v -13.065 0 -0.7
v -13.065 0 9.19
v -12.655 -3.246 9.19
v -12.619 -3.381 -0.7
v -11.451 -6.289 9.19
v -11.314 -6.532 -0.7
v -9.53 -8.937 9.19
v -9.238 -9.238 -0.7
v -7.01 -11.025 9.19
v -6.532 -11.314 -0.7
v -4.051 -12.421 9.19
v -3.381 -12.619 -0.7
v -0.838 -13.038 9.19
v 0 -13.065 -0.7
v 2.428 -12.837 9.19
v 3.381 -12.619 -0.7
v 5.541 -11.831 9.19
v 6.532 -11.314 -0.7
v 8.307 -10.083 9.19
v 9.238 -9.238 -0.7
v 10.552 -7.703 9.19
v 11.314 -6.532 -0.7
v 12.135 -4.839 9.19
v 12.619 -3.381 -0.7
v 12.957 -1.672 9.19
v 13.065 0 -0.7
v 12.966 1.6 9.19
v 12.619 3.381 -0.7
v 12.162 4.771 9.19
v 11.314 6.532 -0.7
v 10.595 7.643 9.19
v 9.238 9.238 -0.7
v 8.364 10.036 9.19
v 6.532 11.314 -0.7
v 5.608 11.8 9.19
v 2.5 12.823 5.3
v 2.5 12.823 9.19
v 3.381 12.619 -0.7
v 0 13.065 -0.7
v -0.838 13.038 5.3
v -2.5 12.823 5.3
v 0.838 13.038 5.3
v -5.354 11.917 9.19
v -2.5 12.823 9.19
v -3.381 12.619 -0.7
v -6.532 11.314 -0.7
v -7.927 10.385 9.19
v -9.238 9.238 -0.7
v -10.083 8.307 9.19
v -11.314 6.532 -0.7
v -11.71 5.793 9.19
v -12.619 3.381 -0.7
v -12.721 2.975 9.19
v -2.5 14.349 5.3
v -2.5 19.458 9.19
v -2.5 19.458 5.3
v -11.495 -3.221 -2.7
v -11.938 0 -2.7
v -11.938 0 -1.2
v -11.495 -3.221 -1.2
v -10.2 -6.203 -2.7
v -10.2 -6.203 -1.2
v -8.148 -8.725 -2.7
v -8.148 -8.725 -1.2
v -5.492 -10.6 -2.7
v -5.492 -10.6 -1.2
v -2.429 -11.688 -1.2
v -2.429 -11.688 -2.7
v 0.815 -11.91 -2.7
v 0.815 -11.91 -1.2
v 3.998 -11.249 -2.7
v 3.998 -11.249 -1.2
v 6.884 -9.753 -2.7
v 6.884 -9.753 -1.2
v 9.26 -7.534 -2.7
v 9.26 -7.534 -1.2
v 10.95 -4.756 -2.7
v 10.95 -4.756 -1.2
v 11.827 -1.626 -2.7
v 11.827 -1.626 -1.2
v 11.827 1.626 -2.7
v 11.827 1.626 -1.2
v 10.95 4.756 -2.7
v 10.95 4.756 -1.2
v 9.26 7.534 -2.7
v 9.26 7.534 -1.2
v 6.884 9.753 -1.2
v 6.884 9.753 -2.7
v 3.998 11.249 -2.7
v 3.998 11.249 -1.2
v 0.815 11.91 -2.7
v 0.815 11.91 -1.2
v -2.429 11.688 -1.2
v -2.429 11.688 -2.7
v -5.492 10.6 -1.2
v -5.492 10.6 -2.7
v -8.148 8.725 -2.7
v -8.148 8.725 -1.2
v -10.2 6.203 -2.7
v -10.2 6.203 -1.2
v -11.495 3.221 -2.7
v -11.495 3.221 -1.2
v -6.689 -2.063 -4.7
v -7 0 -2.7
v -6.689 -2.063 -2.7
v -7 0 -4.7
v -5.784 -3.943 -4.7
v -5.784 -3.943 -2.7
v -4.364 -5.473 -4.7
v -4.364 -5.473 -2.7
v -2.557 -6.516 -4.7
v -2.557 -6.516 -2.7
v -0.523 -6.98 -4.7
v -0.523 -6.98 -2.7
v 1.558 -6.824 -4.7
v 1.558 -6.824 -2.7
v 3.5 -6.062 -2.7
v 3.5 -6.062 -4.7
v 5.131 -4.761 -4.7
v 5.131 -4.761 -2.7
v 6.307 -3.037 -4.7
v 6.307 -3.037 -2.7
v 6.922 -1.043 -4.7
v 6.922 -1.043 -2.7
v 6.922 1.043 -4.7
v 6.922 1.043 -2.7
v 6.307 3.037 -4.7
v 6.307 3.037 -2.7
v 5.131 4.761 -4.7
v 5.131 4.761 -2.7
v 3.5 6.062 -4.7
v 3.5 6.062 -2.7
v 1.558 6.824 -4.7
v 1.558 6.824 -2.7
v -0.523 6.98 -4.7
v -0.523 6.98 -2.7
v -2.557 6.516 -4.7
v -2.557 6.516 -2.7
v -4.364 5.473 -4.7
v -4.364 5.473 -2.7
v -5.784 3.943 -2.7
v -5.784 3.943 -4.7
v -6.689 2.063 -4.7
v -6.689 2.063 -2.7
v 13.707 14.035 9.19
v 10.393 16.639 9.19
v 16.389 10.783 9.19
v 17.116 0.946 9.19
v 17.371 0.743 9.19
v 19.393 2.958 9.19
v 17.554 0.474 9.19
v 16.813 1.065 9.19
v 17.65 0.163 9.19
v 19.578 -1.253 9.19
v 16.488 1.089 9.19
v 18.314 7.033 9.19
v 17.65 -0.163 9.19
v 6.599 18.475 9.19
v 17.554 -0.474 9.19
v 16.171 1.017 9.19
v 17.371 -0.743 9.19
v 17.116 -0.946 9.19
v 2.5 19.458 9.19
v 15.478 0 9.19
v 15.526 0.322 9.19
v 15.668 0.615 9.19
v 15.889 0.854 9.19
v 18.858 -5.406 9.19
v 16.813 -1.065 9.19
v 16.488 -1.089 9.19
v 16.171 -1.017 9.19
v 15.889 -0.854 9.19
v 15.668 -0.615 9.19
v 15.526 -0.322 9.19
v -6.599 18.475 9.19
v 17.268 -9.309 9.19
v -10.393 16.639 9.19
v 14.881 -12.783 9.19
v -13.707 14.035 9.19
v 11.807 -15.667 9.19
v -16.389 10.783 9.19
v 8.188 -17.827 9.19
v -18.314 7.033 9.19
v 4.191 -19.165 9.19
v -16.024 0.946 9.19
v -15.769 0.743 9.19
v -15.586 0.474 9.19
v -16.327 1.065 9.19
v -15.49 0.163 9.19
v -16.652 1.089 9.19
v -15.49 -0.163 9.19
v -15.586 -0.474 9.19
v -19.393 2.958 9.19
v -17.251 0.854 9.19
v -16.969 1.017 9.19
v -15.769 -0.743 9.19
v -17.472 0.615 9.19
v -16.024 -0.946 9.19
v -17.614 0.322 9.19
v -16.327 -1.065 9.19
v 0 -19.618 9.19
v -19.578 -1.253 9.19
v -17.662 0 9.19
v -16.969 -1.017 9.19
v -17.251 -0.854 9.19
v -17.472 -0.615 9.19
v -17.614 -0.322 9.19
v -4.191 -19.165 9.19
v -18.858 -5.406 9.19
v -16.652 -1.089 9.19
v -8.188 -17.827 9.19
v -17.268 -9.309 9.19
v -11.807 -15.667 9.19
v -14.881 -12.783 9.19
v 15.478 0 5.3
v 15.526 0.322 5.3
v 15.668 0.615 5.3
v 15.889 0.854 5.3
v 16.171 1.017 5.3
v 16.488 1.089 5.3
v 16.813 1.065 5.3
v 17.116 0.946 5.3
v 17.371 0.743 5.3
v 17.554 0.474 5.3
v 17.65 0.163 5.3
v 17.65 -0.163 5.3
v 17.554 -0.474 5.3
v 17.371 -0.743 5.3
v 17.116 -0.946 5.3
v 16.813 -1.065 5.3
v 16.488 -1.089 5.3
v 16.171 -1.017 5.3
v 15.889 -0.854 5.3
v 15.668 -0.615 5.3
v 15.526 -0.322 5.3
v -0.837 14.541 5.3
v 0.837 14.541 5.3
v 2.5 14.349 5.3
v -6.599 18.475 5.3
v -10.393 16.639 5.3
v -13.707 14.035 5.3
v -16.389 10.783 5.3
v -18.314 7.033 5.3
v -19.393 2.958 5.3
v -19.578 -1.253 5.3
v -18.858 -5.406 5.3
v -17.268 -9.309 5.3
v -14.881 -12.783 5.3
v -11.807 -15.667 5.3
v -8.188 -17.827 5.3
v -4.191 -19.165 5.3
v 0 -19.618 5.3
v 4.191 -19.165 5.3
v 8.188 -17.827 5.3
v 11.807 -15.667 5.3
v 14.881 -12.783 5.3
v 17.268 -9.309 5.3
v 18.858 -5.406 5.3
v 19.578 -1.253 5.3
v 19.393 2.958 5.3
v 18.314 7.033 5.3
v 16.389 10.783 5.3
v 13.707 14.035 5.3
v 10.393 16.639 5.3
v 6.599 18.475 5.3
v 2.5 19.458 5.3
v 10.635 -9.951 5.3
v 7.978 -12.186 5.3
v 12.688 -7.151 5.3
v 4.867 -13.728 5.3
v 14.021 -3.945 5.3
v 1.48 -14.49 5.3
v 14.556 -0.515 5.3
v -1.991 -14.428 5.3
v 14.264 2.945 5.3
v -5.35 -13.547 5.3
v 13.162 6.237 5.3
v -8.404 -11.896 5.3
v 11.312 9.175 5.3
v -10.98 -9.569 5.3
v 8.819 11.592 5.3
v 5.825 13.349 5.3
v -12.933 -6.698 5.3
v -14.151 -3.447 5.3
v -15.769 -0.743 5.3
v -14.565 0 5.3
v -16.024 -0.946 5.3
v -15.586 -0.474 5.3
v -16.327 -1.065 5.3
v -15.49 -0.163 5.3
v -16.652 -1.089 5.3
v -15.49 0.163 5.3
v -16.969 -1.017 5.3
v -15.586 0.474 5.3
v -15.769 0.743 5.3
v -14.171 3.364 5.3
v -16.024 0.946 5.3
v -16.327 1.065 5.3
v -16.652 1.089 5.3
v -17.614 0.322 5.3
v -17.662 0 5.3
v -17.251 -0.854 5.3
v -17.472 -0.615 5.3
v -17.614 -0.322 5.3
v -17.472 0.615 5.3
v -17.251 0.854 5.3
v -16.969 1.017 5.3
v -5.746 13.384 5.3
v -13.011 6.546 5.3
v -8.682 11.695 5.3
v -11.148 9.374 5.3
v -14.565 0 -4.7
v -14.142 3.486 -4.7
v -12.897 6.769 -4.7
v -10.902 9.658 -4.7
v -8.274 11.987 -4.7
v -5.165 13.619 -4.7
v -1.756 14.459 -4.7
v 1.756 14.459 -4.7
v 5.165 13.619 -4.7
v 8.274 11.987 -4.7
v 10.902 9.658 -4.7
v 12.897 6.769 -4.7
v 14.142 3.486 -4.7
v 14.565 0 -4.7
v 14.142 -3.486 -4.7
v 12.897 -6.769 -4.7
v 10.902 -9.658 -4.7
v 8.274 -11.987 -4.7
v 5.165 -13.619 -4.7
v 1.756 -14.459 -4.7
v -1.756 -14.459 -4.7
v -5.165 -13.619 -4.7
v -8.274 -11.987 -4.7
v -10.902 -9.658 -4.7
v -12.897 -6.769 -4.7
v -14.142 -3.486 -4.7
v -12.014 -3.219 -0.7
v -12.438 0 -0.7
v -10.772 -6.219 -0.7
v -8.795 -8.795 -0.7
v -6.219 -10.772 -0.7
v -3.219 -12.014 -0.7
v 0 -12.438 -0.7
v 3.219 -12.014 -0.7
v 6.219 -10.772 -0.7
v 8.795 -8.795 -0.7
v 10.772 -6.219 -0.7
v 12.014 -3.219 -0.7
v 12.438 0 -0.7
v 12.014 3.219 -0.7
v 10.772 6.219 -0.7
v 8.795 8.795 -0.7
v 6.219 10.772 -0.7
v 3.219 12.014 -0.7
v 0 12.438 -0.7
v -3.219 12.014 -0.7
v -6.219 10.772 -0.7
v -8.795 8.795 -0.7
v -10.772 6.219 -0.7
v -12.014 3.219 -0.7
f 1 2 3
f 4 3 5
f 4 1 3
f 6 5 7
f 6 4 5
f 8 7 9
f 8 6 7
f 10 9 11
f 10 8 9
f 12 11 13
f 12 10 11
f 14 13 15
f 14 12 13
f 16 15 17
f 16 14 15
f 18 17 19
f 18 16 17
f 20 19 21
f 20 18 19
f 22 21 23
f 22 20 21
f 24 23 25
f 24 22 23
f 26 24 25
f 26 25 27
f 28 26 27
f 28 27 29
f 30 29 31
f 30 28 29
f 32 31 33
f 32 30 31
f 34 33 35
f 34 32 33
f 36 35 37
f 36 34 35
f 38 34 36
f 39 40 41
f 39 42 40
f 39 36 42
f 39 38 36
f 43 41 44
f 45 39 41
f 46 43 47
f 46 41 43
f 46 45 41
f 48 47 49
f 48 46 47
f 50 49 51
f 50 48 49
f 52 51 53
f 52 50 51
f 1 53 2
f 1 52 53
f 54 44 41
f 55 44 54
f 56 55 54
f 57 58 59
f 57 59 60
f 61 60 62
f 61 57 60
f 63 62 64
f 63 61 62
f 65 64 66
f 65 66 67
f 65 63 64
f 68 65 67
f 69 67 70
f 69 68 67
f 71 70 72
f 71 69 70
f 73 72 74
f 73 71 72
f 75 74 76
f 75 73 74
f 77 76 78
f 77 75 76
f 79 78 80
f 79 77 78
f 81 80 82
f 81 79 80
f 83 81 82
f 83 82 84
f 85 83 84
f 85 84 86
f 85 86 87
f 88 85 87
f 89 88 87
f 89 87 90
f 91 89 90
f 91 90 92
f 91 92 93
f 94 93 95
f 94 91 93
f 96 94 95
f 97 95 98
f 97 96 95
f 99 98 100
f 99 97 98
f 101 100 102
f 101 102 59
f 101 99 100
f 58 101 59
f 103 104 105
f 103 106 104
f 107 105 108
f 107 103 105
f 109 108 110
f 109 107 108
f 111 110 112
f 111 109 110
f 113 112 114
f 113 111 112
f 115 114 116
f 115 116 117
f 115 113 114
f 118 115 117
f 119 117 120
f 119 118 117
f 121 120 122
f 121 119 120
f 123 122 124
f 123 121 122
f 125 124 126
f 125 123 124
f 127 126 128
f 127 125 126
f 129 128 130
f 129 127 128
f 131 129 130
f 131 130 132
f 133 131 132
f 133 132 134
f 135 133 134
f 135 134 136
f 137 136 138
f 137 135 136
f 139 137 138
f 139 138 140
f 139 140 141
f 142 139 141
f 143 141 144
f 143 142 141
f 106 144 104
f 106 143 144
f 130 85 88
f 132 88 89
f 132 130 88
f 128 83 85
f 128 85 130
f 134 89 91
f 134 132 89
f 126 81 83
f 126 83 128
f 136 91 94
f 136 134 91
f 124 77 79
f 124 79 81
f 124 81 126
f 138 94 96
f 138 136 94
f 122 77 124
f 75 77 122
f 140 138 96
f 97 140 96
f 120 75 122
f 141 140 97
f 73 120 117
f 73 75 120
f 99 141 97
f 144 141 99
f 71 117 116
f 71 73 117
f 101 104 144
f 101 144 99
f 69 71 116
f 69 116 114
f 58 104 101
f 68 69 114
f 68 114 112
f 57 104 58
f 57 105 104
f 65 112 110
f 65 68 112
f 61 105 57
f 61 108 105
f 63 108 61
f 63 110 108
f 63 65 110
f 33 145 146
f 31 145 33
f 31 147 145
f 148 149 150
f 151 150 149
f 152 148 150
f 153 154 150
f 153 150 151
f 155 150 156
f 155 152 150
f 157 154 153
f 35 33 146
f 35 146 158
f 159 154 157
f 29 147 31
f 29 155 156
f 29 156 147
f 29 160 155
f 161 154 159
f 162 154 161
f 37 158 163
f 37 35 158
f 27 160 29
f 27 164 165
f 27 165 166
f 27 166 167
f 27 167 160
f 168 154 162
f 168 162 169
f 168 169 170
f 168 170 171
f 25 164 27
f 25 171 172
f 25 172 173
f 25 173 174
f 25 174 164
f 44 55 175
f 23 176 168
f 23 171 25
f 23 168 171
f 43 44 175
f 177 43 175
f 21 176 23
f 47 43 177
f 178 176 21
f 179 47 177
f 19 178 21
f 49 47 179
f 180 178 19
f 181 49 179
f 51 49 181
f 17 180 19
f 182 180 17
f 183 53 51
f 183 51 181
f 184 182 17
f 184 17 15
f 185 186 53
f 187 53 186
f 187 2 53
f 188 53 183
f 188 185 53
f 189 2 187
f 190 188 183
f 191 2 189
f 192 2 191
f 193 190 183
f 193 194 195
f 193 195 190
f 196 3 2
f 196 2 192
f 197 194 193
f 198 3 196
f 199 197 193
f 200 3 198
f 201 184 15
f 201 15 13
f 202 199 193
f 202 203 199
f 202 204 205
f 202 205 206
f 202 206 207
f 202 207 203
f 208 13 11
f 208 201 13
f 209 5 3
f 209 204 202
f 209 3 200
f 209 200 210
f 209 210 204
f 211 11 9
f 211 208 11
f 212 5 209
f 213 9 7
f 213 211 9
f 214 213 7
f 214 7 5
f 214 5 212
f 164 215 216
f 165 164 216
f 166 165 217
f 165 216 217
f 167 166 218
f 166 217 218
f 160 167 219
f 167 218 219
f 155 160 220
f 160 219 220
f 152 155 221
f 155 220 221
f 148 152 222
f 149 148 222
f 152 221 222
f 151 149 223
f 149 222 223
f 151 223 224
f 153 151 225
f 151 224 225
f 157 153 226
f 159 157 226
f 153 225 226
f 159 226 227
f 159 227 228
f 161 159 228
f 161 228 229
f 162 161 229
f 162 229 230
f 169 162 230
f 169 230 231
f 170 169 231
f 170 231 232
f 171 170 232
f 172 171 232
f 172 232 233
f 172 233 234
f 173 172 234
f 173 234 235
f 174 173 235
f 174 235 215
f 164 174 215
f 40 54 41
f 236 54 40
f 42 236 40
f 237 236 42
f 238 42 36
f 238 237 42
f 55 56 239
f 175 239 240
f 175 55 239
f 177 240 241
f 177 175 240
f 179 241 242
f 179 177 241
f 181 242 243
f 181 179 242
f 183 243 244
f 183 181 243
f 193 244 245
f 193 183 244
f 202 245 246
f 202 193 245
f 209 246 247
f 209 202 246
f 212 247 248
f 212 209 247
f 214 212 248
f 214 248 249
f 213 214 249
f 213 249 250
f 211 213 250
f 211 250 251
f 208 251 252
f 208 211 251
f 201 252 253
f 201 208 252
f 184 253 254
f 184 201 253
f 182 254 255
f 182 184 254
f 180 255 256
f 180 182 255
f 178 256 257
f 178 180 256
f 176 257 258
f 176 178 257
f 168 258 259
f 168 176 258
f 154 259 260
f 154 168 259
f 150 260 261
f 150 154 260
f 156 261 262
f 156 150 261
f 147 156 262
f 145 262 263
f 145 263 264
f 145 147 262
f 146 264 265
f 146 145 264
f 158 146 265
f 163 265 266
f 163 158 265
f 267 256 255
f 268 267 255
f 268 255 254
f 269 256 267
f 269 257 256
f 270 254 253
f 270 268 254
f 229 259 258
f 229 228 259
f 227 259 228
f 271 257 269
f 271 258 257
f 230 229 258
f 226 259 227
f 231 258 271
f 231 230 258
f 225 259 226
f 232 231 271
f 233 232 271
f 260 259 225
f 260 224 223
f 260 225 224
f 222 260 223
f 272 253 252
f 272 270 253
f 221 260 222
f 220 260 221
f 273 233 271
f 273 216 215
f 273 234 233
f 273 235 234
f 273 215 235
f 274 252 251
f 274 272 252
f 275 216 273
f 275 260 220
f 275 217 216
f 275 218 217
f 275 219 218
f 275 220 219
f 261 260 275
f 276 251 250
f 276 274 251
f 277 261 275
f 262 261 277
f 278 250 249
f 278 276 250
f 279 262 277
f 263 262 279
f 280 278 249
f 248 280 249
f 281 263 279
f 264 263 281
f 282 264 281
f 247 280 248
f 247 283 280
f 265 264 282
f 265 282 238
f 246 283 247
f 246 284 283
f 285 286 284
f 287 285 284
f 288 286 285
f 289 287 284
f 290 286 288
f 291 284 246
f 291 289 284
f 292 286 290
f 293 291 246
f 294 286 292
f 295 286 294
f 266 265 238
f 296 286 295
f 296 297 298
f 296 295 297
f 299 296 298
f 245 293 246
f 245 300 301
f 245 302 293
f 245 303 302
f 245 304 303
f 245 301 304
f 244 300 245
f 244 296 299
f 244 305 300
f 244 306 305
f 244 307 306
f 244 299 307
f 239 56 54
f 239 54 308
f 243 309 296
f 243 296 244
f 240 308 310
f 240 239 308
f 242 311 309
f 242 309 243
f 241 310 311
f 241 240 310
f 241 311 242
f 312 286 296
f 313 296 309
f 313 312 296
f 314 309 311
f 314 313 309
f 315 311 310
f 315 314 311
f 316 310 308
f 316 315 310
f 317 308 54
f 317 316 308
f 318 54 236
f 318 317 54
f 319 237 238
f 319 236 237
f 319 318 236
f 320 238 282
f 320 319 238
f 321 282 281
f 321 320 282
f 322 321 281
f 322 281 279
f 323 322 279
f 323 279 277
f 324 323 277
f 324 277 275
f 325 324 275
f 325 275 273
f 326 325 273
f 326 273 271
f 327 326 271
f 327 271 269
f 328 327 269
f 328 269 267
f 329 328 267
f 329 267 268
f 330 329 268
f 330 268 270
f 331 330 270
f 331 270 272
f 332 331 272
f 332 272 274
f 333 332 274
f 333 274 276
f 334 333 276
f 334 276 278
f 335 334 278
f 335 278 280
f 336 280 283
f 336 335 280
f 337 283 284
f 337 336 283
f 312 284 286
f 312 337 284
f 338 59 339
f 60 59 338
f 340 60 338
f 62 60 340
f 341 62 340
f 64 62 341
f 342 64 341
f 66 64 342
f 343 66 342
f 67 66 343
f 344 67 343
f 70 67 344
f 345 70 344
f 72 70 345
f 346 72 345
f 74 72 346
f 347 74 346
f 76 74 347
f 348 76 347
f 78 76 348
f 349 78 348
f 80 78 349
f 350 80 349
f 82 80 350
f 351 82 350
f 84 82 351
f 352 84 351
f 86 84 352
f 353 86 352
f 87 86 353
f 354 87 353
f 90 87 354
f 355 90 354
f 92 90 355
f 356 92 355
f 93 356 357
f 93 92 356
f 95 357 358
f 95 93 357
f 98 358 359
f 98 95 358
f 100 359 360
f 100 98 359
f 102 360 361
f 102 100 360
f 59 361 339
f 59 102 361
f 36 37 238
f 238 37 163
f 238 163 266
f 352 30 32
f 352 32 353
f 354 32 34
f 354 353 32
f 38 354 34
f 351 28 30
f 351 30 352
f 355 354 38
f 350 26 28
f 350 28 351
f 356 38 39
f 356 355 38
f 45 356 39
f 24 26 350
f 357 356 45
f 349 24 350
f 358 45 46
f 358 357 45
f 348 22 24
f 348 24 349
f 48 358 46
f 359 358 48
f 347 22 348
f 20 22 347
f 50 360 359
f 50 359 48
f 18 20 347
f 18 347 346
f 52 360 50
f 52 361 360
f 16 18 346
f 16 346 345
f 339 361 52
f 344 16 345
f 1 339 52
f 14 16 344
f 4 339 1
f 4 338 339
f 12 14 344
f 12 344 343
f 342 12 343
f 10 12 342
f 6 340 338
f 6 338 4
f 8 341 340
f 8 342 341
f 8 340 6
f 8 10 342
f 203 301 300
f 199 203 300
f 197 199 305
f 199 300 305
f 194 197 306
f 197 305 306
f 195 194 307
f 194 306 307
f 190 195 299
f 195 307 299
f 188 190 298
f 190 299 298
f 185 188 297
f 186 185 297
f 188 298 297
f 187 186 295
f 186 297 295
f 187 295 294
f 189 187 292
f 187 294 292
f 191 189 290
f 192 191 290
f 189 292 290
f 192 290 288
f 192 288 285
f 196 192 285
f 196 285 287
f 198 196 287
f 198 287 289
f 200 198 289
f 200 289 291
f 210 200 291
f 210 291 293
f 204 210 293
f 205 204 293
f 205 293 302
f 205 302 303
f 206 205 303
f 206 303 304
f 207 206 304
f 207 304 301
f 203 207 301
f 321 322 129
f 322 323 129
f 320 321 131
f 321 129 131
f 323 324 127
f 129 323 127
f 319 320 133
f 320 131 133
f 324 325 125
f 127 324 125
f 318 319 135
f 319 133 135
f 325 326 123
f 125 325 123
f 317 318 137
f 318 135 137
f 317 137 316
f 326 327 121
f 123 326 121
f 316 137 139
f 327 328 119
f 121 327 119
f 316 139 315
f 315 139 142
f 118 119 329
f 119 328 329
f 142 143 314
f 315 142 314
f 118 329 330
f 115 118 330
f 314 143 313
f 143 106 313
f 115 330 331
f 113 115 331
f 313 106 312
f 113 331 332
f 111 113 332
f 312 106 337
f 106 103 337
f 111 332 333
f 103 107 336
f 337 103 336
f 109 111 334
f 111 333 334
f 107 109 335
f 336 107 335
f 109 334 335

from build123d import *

# Parameters (mm, degrees)
SKETCH1_W          = 12.617819502
SKETCH1_H          = 2
SKETCH1_W_2        = 6.5532
SKETCH1_H_2        = 9.89
SKETCH2_R          = 26.652766262
SKETCH2_R_2        = 14.565
CUT_EXTRUDE1_DEPTH = 10
SKETCH4_R          = 1.0922
CUT_EXTRUDE2_DEPTH = 4.89
CHAMFER1_SIZE      = 0.5
CUT_EXTRUDE3_DEPTH = 10
SKETCH6_W          = 5
SKETCH6_H          = 3.89
CUT_EXTRUDE4_DEPTH = 10


with BuildPart() as part:
    # Sketch1 → Revolve1 (revolve)
    with BuildSketch(Plane(origin=(0, 0, 0), x_dir=(1, 0, 0), z_dir=(0, 1, 0))):
        with Locations((-13.308909751, 3.700473465)):
            Rectangle(SKETCH1_W, SKETCH1_H)
        Polygon((-11.938, 2.700473465), (-19.617819502, 2.700473465), (-19.617819502, 0.700473465), (-13.064619502, 0.700473465), (-11.938, 0.700473465), align=None)
        with Locations((-16.341219502, -4.244526535)):
            Rectangle(SKETCH1_W_2, SKETCH1_H_2)
    revolve(axis=Axis((0, 0, -25.411285606), (0, 0, 1)))

    # Sketch2 → Cut-Extrude1 (cut)
    with BuildSketch(Plane(origin=(0, 0, -4.700473465), x_dir=(-1, 0, 0), z_dir=(0, 0, -1))):
        Circle(SKETCH2_R)
        Circle(SKETCH2_R_2, mode=Mode.SUBTRACT)
    extrude(amount=-CUT_EXTRUDE1_DEPTH, mode=Mode.SUBTRACT)

    # Sketch4 → Cut-Extrude2 (cut, through all)
    with BuildSketch(Plane(origin=(0, 0, 5.299526535), x_dir=(-1, 0, 0), z_dir=(0, 0, -1))):
        with Locations((16.57, 0)):
            Circle(SKETCH4_R)
        with Locations((-16.57, 0)):
            Circle(SKETCH4_R)
    extrude(amount=-CUT_EXTRUDE2_DEPTH, mode=Mode.SUBTRACT)

    # Chamfer1
    chamfer1_edges = [part.edges().sort_by_distance(p)[0] for p in [
        (11.938, 0, -0.700473465),
    ]]
    chamfer(chamfer1_edges, length=CHAMFER1_SIZE)

    # Sketch5 → Cut-Extrude3 (cut)
    with BuildSketch(Plane(origin=(0, 0, 5.299526535), x_dir=(-1, 0, 0), z_dir=(0, 0, -1))):
        with BuildLine():
            Line((0, 19.617819502), (0, 14.565))
            Line((0, 14.565), (2.5, 14.565))
            Line((2.5, 14.565), (2.5, 19.457873522))
            ThreePointArc((2.5, 19.457873522), (1.252555659, 19.577792172), (0, 19.617819502))
        make_face()
        with BuildLine():
            Line((-2.5, 19.457873522), (-2.5, 14.565))
            Line((-2.5, 14.565), (0, 14.565))
            Line((0, 14.565), (0, 19.617819502))
            ThreePointArc((0, 19.617819502), (-1.252555659, 19.577792172), (-2.5, 19.457873522))
        make_face()
    extrude(amount=-CUT_EXTRUDE3_DEPTH, mode=Mode.SUBTRACT)

    # Sketch6 → Cut-Extrude4 (cut)
    with BuildSketch(Plane(origin=(0, 14.565, 0), x_dir=(1, 0, 0), z_dir=(0, 1, 0))):
        with Locations((0, -7.244526535)):
            Rectangle(SKETCH6_W, SKETCH6_H)
    extrude(amount=-CUT_EXTRUDE4_DEPTH, mode=Mode.SUBTRACT)


solid = part.part
